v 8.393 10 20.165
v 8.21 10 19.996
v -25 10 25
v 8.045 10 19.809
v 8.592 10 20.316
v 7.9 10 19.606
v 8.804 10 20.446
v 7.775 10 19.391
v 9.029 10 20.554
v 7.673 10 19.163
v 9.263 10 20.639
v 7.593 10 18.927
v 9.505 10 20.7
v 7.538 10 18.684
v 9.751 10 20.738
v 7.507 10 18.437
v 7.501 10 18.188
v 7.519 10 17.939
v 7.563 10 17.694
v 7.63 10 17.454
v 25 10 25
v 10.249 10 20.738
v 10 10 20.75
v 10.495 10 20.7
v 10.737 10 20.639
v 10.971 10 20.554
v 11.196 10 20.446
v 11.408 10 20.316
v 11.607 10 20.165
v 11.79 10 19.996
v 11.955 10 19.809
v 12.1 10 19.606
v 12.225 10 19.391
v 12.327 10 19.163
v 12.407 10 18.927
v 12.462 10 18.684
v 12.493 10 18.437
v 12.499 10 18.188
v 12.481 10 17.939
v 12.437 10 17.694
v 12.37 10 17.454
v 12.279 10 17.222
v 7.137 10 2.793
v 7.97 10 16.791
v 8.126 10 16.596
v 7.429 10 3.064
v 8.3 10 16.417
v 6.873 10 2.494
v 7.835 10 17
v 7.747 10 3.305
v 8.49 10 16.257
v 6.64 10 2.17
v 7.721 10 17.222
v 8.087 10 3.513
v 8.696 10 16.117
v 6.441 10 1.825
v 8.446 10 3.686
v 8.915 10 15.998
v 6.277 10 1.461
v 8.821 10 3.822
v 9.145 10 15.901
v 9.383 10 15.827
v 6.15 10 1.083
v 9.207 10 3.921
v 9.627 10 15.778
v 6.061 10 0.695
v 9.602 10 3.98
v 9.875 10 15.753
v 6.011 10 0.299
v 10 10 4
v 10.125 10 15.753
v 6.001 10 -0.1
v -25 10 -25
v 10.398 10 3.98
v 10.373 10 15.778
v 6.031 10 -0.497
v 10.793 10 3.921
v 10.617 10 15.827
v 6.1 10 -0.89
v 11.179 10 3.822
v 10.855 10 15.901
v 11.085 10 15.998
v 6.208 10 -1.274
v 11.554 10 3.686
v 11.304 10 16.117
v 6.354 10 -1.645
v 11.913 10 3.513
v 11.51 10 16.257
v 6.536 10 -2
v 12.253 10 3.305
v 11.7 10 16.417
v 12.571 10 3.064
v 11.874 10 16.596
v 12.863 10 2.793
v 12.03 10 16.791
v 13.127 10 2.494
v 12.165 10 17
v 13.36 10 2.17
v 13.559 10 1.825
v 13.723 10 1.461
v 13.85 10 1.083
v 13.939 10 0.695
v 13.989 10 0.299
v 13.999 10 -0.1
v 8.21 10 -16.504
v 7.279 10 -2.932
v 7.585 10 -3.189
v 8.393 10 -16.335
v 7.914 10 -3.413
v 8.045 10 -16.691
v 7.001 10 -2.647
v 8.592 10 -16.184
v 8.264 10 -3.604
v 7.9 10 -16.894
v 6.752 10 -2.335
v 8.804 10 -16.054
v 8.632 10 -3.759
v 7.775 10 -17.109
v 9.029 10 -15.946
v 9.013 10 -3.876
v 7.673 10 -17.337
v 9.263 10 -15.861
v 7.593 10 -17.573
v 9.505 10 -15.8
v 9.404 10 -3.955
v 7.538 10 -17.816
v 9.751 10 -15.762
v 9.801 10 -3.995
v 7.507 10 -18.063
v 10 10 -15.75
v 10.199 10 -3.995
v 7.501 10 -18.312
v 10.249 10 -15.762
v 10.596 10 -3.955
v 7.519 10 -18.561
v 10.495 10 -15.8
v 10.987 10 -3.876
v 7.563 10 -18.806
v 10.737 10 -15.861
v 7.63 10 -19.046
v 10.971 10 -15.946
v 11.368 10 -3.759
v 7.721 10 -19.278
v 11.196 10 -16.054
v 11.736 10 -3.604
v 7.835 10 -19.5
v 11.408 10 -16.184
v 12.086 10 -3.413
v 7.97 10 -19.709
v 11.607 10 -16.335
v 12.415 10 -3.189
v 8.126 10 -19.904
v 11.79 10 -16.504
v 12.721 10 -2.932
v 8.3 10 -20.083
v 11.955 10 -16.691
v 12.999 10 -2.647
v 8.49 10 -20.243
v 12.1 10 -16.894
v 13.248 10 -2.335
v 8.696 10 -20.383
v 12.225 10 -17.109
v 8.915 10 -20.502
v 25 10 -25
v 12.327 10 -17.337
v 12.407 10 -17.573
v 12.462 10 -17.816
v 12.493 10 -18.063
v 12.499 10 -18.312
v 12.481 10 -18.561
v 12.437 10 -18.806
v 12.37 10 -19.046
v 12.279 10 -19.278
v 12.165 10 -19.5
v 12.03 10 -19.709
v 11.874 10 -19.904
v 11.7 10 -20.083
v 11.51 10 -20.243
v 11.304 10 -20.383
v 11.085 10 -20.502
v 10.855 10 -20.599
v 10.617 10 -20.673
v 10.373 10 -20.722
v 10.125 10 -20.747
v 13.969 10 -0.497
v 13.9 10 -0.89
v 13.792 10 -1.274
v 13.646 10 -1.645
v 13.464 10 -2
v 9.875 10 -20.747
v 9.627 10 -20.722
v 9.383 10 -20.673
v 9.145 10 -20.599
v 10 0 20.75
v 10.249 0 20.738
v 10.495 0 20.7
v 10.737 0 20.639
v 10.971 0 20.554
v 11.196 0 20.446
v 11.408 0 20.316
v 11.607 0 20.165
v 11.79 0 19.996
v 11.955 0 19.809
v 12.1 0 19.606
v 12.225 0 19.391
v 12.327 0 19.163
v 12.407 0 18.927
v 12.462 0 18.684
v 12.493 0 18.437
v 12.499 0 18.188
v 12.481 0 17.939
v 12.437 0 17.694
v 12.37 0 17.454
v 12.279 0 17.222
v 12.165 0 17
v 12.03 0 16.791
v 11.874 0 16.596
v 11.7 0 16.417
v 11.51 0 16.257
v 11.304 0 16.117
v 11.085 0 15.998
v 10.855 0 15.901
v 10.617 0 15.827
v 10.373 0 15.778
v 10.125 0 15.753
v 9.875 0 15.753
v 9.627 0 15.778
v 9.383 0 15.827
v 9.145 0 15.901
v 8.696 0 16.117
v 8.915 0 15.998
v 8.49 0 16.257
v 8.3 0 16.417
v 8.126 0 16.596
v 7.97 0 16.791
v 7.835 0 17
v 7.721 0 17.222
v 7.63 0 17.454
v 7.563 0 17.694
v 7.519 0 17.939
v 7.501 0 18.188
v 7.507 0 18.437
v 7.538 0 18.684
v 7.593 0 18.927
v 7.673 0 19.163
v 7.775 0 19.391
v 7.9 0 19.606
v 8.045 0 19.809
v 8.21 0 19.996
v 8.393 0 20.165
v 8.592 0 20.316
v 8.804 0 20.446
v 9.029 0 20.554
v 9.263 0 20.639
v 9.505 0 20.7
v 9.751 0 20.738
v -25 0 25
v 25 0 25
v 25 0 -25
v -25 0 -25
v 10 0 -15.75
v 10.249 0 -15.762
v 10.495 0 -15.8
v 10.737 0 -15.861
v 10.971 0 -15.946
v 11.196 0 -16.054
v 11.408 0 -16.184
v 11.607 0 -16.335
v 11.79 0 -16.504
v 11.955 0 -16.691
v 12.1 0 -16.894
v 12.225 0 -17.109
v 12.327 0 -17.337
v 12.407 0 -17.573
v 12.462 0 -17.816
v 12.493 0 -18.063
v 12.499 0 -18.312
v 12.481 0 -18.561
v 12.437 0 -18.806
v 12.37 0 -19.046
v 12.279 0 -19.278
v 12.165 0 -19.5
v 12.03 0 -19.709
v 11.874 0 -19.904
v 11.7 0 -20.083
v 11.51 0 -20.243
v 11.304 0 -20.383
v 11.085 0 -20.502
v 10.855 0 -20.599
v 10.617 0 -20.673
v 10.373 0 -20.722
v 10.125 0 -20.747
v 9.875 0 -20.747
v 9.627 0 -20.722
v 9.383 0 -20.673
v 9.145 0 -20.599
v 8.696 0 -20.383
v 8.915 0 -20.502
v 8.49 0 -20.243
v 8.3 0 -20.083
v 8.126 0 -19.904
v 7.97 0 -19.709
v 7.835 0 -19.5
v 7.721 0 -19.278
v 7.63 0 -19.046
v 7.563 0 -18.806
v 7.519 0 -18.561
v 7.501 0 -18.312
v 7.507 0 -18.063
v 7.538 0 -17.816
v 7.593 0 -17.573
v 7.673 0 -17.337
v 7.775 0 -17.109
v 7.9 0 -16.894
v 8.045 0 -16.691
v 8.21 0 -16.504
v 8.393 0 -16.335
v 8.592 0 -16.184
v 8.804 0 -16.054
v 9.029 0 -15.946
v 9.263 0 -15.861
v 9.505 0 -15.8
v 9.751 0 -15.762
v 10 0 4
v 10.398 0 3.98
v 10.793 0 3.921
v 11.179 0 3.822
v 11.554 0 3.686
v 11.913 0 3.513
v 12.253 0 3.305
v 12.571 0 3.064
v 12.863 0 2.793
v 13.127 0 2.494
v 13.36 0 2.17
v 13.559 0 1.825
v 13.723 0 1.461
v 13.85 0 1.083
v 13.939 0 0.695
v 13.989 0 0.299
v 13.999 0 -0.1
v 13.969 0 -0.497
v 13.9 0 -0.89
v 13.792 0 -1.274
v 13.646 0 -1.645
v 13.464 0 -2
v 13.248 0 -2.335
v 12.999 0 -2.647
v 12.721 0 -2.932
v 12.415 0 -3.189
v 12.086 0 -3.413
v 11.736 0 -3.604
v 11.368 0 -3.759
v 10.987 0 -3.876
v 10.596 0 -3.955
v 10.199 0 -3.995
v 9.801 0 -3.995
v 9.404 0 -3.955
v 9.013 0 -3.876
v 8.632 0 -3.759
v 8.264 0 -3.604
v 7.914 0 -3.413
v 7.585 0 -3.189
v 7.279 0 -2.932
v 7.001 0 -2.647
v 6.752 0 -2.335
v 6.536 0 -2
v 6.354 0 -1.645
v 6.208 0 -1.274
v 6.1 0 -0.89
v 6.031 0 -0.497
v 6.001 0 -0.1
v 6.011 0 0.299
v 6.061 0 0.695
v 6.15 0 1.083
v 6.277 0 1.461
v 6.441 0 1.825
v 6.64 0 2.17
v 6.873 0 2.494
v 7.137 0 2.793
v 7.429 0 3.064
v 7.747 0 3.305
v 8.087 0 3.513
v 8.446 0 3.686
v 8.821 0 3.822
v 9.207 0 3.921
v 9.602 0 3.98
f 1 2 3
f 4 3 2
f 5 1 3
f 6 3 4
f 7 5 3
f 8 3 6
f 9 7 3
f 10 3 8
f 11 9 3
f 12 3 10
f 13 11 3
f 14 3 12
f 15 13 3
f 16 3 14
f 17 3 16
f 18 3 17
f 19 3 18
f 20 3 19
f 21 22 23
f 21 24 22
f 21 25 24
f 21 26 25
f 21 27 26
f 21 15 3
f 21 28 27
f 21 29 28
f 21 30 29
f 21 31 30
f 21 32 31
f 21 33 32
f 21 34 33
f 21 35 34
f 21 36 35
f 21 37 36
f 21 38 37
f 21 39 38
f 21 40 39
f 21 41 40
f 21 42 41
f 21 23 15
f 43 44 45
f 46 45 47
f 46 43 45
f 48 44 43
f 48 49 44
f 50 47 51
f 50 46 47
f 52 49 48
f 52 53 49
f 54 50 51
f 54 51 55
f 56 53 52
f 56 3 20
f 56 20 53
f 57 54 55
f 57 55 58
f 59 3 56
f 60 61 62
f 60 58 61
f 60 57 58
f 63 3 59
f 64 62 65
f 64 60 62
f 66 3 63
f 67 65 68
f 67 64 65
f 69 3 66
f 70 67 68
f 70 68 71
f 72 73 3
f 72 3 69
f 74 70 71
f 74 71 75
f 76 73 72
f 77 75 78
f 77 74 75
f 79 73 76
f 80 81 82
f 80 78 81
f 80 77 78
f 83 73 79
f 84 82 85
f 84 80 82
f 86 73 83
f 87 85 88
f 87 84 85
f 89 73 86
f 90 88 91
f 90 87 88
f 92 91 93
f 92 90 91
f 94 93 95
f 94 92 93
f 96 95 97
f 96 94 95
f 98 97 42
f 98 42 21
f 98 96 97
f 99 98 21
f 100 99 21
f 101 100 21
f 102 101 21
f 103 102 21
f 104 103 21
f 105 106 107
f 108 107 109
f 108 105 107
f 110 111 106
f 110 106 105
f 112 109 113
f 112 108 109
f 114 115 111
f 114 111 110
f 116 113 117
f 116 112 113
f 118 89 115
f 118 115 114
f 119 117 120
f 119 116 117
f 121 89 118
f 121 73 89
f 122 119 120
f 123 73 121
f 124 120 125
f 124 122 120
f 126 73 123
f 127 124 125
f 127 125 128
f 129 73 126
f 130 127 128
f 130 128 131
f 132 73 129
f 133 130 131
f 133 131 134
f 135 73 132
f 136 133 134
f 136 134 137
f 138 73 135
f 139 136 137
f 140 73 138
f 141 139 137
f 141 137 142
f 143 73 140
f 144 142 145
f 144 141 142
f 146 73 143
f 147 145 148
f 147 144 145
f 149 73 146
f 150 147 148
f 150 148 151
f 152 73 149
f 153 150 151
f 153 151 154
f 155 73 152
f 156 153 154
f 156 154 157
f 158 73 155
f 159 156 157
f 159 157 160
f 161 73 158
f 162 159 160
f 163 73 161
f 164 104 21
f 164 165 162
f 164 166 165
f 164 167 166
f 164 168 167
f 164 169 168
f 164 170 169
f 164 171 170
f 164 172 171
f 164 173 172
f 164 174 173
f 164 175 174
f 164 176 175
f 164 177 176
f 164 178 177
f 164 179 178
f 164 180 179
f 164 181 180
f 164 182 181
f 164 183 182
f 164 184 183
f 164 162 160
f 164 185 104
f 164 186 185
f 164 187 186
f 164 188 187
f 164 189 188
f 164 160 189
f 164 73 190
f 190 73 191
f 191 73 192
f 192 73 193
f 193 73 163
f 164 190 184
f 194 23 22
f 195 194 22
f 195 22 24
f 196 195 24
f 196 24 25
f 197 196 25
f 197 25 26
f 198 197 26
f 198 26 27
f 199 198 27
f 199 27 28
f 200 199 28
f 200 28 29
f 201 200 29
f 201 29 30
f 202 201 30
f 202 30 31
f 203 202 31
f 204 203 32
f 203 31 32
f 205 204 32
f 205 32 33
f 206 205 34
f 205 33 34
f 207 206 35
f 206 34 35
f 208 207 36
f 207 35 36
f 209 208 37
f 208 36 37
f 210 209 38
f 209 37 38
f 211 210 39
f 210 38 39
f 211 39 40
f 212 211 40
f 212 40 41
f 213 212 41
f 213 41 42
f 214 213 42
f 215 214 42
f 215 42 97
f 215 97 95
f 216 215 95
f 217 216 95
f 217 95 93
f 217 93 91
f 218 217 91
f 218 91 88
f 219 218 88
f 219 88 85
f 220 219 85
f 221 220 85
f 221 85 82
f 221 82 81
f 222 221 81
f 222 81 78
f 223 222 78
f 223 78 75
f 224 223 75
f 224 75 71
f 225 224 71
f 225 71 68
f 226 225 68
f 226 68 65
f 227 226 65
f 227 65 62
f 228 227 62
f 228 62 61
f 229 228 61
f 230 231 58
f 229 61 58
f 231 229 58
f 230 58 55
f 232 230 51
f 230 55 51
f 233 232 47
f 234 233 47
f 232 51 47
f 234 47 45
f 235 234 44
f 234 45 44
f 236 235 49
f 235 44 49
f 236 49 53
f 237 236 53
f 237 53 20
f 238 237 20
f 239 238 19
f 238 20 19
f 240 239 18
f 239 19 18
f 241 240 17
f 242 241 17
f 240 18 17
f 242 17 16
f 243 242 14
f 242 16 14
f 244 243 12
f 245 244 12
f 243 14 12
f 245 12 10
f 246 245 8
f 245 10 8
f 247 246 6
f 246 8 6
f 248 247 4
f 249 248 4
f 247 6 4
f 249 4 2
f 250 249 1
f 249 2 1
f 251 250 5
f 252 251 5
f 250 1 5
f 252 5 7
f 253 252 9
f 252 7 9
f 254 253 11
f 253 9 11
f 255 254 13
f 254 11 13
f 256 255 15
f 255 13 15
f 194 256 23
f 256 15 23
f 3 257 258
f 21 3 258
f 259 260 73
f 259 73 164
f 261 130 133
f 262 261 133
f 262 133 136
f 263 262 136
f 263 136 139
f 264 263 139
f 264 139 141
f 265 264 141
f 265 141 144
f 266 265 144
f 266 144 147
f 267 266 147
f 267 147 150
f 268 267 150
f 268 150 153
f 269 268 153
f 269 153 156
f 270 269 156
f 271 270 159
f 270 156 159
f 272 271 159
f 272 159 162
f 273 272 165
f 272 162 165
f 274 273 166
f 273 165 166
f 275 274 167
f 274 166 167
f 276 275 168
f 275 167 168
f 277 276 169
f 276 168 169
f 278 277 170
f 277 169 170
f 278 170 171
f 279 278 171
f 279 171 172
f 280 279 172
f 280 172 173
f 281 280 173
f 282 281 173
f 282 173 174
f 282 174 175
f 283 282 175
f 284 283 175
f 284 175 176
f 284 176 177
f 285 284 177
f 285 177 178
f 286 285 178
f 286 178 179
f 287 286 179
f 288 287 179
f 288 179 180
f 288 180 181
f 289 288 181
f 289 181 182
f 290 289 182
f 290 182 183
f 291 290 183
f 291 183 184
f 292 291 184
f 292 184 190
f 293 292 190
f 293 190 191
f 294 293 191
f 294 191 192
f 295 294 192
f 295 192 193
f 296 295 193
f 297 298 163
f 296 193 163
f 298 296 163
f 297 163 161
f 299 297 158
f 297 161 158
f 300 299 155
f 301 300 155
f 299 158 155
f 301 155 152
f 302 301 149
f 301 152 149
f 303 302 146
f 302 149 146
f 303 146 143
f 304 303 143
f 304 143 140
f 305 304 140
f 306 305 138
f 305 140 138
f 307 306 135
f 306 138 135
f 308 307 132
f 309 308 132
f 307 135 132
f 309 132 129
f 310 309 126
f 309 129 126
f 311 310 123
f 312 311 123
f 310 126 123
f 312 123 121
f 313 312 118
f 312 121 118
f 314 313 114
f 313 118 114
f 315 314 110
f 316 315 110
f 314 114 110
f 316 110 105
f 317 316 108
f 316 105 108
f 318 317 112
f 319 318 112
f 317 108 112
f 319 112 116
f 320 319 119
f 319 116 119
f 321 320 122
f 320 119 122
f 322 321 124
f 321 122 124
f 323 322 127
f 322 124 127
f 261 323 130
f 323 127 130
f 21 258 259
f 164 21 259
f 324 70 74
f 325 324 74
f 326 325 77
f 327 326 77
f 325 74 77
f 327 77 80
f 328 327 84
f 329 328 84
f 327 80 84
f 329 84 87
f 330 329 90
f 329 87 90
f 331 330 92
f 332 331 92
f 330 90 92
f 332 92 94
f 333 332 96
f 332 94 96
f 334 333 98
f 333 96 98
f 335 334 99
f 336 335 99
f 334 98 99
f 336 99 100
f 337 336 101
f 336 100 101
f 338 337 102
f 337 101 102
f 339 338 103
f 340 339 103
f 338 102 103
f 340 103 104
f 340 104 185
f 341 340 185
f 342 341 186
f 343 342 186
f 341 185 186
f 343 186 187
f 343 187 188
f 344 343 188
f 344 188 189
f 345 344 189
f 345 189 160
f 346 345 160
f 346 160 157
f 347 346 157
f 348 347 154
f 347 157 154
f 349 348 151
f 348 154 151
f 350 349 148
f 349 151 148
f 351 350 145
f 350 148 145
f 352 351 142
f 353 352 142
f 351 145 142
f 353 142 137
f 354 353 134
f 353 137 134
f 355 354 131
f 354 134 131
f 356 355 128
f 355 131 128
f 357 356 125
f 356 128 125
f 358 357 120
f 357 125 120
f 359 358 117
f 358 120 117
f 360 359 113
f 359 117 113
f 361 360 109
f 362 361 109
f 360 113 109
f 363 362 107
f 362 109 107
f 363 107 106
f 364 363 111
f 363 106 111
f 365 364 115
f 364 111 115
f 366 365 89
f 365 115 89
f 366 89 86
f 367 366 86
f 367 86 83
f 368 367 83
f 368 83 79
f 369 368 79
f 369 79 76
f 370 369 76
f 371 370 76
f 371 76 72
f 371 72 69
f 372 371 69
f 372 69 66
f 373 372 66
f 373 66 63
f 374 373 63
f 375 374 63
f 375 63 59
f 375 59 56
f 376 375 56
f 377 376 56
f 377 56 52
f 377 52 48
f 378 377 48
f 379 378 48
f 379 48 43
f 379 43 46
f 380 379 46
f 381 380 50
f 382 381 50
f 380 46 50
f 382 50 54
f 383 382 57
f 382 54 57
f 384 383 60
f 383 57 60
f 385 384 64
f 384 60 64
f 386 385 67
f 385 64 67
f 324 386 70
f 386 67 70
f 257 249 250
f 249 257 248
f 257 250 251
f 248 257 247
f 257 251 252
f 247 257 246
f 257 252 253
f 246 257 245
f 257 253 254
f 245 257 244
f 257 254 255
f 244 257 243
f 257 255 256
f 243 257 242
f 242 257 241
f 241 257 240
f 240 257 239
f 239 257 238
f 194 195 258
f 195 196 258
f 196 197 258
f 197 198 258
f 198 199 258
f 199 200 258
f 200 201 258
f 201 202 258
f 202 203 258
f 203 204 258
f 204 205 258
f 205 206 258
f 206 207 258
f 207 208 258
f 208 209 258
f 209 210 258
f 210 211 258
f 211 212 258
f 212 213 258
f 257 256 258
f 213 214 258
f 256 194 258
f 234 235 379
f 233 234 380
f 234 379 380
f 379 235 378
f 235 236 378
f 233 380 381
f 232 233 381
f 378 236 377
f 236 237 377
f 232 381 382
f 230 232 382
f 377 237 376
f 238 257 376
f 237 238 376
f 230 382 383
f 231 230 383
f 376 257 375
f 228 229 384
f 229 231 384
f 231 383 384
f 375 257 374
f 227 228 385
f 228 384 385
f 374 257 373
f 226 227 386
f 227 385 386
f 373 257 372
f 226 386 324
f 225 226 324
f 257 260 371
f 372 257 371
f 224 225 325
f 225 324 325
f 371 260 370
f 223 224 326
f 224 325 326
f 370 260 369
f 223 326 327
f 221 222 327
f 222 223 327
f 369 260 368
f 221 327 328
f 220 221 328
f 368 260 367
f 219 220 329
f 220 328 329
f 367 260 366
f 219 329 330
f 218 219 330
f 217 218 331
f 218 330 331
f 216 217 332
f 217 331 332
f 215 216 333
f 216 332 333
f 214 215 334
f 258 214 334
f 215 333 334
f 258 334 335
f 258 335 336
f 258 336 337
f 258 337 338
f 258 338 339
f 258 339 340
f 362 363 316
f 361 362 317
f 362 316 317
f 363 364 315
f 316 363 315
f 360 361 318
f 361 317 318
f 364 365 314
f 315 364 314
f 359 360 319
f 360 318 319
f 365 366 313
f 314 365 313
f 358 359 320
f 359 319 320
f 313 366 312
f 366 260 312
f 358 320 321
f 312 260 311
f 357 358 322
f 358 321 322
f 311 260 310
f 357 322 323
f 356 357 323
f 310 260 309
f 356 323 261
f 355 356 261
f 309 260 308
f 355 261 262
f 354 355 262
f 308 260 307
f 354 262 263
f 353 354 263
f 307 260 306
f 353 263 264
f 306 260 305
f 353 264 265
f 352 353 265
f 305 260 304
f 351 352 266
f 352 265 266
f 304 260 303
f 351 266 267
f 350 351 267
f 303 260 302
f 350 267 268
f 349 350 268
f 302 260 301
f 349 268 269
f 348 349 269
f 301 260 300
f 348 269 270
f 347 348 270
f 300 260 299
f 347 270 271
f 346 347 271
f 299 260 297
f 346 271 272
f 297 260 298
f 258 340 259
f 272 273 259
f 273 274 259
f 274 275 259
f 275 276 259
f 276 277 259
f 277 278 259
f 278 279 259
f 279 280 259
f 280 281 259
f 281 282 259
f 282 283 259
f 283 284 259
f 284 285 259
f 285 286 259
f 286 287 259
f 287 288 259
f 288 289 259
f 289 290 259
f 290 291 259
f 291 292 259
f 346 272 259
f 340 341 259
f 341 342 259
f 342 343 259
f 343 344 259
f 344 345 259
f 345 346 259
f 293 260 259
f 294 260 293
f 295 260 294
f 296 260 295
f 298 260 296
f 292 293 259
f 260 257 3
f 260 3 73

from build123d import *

# Parameters (mm, degrees)
ESBO_O2_W                = 50
ESBO_O2_H                = 50
RESSALTO_EXTRUS_O2_DEPTH = 10
ESBO_O5_R                = 2.5
CORTE_EXTRUS_O5_DEPTH    = 37.742346142
ESBO_O6_R                = 4
CORTE_EXTRUS_O6_DEPTH    = 10


with BuildPart() as part:
    # Esboço2 → Ressalto-extrusão2 (new body)
    with BuildSketch(Plane(origin=(0, 0, 0), x_dir=(1, 0, 0), z_dir=(0, 1, 0))):
        Rectangle(ESBO_O2_W, ESBO_O2_H)
    extrude(amount=RESSALTO_EXTRUS_O2_DEPTH)

    # Esboço5 → Corte-extrusão5 (cut, through all)
    with BuildSketch(Plane(origin=(0, 10, 0), x_dir=(1, 0, 0), z_dir=(0, 1, 0))):
        with Locations(Location((10, 18.25, 0), (0, 0, 270))):
            Circle(ESBO_O5_R)
        with Locations(Location((10, -18.25, 0), (0, 0, 270))):
            Circle(ESBO_O5_R)
    extrude(amount=-CORTE_EXTRUS_O5_DEPTH, mode=Mode.SUBTRACT)

    # Esboço6 → Corte-extrusão6 (cut)
    with BuildSketch(Plane(origin=(0, 10, 0), x_dir=(1, 0, 0), z_dir=(0, 1, 0))):
        with Locations(Location((10, 0, 0), (0, 0, 270))):
            Circle(ESBO_O6_R)
    extrude(amount=-CORTE_EXTRUS_O6_DEPTH, mode=Mode.SUBTRACT)


solid = part.part
